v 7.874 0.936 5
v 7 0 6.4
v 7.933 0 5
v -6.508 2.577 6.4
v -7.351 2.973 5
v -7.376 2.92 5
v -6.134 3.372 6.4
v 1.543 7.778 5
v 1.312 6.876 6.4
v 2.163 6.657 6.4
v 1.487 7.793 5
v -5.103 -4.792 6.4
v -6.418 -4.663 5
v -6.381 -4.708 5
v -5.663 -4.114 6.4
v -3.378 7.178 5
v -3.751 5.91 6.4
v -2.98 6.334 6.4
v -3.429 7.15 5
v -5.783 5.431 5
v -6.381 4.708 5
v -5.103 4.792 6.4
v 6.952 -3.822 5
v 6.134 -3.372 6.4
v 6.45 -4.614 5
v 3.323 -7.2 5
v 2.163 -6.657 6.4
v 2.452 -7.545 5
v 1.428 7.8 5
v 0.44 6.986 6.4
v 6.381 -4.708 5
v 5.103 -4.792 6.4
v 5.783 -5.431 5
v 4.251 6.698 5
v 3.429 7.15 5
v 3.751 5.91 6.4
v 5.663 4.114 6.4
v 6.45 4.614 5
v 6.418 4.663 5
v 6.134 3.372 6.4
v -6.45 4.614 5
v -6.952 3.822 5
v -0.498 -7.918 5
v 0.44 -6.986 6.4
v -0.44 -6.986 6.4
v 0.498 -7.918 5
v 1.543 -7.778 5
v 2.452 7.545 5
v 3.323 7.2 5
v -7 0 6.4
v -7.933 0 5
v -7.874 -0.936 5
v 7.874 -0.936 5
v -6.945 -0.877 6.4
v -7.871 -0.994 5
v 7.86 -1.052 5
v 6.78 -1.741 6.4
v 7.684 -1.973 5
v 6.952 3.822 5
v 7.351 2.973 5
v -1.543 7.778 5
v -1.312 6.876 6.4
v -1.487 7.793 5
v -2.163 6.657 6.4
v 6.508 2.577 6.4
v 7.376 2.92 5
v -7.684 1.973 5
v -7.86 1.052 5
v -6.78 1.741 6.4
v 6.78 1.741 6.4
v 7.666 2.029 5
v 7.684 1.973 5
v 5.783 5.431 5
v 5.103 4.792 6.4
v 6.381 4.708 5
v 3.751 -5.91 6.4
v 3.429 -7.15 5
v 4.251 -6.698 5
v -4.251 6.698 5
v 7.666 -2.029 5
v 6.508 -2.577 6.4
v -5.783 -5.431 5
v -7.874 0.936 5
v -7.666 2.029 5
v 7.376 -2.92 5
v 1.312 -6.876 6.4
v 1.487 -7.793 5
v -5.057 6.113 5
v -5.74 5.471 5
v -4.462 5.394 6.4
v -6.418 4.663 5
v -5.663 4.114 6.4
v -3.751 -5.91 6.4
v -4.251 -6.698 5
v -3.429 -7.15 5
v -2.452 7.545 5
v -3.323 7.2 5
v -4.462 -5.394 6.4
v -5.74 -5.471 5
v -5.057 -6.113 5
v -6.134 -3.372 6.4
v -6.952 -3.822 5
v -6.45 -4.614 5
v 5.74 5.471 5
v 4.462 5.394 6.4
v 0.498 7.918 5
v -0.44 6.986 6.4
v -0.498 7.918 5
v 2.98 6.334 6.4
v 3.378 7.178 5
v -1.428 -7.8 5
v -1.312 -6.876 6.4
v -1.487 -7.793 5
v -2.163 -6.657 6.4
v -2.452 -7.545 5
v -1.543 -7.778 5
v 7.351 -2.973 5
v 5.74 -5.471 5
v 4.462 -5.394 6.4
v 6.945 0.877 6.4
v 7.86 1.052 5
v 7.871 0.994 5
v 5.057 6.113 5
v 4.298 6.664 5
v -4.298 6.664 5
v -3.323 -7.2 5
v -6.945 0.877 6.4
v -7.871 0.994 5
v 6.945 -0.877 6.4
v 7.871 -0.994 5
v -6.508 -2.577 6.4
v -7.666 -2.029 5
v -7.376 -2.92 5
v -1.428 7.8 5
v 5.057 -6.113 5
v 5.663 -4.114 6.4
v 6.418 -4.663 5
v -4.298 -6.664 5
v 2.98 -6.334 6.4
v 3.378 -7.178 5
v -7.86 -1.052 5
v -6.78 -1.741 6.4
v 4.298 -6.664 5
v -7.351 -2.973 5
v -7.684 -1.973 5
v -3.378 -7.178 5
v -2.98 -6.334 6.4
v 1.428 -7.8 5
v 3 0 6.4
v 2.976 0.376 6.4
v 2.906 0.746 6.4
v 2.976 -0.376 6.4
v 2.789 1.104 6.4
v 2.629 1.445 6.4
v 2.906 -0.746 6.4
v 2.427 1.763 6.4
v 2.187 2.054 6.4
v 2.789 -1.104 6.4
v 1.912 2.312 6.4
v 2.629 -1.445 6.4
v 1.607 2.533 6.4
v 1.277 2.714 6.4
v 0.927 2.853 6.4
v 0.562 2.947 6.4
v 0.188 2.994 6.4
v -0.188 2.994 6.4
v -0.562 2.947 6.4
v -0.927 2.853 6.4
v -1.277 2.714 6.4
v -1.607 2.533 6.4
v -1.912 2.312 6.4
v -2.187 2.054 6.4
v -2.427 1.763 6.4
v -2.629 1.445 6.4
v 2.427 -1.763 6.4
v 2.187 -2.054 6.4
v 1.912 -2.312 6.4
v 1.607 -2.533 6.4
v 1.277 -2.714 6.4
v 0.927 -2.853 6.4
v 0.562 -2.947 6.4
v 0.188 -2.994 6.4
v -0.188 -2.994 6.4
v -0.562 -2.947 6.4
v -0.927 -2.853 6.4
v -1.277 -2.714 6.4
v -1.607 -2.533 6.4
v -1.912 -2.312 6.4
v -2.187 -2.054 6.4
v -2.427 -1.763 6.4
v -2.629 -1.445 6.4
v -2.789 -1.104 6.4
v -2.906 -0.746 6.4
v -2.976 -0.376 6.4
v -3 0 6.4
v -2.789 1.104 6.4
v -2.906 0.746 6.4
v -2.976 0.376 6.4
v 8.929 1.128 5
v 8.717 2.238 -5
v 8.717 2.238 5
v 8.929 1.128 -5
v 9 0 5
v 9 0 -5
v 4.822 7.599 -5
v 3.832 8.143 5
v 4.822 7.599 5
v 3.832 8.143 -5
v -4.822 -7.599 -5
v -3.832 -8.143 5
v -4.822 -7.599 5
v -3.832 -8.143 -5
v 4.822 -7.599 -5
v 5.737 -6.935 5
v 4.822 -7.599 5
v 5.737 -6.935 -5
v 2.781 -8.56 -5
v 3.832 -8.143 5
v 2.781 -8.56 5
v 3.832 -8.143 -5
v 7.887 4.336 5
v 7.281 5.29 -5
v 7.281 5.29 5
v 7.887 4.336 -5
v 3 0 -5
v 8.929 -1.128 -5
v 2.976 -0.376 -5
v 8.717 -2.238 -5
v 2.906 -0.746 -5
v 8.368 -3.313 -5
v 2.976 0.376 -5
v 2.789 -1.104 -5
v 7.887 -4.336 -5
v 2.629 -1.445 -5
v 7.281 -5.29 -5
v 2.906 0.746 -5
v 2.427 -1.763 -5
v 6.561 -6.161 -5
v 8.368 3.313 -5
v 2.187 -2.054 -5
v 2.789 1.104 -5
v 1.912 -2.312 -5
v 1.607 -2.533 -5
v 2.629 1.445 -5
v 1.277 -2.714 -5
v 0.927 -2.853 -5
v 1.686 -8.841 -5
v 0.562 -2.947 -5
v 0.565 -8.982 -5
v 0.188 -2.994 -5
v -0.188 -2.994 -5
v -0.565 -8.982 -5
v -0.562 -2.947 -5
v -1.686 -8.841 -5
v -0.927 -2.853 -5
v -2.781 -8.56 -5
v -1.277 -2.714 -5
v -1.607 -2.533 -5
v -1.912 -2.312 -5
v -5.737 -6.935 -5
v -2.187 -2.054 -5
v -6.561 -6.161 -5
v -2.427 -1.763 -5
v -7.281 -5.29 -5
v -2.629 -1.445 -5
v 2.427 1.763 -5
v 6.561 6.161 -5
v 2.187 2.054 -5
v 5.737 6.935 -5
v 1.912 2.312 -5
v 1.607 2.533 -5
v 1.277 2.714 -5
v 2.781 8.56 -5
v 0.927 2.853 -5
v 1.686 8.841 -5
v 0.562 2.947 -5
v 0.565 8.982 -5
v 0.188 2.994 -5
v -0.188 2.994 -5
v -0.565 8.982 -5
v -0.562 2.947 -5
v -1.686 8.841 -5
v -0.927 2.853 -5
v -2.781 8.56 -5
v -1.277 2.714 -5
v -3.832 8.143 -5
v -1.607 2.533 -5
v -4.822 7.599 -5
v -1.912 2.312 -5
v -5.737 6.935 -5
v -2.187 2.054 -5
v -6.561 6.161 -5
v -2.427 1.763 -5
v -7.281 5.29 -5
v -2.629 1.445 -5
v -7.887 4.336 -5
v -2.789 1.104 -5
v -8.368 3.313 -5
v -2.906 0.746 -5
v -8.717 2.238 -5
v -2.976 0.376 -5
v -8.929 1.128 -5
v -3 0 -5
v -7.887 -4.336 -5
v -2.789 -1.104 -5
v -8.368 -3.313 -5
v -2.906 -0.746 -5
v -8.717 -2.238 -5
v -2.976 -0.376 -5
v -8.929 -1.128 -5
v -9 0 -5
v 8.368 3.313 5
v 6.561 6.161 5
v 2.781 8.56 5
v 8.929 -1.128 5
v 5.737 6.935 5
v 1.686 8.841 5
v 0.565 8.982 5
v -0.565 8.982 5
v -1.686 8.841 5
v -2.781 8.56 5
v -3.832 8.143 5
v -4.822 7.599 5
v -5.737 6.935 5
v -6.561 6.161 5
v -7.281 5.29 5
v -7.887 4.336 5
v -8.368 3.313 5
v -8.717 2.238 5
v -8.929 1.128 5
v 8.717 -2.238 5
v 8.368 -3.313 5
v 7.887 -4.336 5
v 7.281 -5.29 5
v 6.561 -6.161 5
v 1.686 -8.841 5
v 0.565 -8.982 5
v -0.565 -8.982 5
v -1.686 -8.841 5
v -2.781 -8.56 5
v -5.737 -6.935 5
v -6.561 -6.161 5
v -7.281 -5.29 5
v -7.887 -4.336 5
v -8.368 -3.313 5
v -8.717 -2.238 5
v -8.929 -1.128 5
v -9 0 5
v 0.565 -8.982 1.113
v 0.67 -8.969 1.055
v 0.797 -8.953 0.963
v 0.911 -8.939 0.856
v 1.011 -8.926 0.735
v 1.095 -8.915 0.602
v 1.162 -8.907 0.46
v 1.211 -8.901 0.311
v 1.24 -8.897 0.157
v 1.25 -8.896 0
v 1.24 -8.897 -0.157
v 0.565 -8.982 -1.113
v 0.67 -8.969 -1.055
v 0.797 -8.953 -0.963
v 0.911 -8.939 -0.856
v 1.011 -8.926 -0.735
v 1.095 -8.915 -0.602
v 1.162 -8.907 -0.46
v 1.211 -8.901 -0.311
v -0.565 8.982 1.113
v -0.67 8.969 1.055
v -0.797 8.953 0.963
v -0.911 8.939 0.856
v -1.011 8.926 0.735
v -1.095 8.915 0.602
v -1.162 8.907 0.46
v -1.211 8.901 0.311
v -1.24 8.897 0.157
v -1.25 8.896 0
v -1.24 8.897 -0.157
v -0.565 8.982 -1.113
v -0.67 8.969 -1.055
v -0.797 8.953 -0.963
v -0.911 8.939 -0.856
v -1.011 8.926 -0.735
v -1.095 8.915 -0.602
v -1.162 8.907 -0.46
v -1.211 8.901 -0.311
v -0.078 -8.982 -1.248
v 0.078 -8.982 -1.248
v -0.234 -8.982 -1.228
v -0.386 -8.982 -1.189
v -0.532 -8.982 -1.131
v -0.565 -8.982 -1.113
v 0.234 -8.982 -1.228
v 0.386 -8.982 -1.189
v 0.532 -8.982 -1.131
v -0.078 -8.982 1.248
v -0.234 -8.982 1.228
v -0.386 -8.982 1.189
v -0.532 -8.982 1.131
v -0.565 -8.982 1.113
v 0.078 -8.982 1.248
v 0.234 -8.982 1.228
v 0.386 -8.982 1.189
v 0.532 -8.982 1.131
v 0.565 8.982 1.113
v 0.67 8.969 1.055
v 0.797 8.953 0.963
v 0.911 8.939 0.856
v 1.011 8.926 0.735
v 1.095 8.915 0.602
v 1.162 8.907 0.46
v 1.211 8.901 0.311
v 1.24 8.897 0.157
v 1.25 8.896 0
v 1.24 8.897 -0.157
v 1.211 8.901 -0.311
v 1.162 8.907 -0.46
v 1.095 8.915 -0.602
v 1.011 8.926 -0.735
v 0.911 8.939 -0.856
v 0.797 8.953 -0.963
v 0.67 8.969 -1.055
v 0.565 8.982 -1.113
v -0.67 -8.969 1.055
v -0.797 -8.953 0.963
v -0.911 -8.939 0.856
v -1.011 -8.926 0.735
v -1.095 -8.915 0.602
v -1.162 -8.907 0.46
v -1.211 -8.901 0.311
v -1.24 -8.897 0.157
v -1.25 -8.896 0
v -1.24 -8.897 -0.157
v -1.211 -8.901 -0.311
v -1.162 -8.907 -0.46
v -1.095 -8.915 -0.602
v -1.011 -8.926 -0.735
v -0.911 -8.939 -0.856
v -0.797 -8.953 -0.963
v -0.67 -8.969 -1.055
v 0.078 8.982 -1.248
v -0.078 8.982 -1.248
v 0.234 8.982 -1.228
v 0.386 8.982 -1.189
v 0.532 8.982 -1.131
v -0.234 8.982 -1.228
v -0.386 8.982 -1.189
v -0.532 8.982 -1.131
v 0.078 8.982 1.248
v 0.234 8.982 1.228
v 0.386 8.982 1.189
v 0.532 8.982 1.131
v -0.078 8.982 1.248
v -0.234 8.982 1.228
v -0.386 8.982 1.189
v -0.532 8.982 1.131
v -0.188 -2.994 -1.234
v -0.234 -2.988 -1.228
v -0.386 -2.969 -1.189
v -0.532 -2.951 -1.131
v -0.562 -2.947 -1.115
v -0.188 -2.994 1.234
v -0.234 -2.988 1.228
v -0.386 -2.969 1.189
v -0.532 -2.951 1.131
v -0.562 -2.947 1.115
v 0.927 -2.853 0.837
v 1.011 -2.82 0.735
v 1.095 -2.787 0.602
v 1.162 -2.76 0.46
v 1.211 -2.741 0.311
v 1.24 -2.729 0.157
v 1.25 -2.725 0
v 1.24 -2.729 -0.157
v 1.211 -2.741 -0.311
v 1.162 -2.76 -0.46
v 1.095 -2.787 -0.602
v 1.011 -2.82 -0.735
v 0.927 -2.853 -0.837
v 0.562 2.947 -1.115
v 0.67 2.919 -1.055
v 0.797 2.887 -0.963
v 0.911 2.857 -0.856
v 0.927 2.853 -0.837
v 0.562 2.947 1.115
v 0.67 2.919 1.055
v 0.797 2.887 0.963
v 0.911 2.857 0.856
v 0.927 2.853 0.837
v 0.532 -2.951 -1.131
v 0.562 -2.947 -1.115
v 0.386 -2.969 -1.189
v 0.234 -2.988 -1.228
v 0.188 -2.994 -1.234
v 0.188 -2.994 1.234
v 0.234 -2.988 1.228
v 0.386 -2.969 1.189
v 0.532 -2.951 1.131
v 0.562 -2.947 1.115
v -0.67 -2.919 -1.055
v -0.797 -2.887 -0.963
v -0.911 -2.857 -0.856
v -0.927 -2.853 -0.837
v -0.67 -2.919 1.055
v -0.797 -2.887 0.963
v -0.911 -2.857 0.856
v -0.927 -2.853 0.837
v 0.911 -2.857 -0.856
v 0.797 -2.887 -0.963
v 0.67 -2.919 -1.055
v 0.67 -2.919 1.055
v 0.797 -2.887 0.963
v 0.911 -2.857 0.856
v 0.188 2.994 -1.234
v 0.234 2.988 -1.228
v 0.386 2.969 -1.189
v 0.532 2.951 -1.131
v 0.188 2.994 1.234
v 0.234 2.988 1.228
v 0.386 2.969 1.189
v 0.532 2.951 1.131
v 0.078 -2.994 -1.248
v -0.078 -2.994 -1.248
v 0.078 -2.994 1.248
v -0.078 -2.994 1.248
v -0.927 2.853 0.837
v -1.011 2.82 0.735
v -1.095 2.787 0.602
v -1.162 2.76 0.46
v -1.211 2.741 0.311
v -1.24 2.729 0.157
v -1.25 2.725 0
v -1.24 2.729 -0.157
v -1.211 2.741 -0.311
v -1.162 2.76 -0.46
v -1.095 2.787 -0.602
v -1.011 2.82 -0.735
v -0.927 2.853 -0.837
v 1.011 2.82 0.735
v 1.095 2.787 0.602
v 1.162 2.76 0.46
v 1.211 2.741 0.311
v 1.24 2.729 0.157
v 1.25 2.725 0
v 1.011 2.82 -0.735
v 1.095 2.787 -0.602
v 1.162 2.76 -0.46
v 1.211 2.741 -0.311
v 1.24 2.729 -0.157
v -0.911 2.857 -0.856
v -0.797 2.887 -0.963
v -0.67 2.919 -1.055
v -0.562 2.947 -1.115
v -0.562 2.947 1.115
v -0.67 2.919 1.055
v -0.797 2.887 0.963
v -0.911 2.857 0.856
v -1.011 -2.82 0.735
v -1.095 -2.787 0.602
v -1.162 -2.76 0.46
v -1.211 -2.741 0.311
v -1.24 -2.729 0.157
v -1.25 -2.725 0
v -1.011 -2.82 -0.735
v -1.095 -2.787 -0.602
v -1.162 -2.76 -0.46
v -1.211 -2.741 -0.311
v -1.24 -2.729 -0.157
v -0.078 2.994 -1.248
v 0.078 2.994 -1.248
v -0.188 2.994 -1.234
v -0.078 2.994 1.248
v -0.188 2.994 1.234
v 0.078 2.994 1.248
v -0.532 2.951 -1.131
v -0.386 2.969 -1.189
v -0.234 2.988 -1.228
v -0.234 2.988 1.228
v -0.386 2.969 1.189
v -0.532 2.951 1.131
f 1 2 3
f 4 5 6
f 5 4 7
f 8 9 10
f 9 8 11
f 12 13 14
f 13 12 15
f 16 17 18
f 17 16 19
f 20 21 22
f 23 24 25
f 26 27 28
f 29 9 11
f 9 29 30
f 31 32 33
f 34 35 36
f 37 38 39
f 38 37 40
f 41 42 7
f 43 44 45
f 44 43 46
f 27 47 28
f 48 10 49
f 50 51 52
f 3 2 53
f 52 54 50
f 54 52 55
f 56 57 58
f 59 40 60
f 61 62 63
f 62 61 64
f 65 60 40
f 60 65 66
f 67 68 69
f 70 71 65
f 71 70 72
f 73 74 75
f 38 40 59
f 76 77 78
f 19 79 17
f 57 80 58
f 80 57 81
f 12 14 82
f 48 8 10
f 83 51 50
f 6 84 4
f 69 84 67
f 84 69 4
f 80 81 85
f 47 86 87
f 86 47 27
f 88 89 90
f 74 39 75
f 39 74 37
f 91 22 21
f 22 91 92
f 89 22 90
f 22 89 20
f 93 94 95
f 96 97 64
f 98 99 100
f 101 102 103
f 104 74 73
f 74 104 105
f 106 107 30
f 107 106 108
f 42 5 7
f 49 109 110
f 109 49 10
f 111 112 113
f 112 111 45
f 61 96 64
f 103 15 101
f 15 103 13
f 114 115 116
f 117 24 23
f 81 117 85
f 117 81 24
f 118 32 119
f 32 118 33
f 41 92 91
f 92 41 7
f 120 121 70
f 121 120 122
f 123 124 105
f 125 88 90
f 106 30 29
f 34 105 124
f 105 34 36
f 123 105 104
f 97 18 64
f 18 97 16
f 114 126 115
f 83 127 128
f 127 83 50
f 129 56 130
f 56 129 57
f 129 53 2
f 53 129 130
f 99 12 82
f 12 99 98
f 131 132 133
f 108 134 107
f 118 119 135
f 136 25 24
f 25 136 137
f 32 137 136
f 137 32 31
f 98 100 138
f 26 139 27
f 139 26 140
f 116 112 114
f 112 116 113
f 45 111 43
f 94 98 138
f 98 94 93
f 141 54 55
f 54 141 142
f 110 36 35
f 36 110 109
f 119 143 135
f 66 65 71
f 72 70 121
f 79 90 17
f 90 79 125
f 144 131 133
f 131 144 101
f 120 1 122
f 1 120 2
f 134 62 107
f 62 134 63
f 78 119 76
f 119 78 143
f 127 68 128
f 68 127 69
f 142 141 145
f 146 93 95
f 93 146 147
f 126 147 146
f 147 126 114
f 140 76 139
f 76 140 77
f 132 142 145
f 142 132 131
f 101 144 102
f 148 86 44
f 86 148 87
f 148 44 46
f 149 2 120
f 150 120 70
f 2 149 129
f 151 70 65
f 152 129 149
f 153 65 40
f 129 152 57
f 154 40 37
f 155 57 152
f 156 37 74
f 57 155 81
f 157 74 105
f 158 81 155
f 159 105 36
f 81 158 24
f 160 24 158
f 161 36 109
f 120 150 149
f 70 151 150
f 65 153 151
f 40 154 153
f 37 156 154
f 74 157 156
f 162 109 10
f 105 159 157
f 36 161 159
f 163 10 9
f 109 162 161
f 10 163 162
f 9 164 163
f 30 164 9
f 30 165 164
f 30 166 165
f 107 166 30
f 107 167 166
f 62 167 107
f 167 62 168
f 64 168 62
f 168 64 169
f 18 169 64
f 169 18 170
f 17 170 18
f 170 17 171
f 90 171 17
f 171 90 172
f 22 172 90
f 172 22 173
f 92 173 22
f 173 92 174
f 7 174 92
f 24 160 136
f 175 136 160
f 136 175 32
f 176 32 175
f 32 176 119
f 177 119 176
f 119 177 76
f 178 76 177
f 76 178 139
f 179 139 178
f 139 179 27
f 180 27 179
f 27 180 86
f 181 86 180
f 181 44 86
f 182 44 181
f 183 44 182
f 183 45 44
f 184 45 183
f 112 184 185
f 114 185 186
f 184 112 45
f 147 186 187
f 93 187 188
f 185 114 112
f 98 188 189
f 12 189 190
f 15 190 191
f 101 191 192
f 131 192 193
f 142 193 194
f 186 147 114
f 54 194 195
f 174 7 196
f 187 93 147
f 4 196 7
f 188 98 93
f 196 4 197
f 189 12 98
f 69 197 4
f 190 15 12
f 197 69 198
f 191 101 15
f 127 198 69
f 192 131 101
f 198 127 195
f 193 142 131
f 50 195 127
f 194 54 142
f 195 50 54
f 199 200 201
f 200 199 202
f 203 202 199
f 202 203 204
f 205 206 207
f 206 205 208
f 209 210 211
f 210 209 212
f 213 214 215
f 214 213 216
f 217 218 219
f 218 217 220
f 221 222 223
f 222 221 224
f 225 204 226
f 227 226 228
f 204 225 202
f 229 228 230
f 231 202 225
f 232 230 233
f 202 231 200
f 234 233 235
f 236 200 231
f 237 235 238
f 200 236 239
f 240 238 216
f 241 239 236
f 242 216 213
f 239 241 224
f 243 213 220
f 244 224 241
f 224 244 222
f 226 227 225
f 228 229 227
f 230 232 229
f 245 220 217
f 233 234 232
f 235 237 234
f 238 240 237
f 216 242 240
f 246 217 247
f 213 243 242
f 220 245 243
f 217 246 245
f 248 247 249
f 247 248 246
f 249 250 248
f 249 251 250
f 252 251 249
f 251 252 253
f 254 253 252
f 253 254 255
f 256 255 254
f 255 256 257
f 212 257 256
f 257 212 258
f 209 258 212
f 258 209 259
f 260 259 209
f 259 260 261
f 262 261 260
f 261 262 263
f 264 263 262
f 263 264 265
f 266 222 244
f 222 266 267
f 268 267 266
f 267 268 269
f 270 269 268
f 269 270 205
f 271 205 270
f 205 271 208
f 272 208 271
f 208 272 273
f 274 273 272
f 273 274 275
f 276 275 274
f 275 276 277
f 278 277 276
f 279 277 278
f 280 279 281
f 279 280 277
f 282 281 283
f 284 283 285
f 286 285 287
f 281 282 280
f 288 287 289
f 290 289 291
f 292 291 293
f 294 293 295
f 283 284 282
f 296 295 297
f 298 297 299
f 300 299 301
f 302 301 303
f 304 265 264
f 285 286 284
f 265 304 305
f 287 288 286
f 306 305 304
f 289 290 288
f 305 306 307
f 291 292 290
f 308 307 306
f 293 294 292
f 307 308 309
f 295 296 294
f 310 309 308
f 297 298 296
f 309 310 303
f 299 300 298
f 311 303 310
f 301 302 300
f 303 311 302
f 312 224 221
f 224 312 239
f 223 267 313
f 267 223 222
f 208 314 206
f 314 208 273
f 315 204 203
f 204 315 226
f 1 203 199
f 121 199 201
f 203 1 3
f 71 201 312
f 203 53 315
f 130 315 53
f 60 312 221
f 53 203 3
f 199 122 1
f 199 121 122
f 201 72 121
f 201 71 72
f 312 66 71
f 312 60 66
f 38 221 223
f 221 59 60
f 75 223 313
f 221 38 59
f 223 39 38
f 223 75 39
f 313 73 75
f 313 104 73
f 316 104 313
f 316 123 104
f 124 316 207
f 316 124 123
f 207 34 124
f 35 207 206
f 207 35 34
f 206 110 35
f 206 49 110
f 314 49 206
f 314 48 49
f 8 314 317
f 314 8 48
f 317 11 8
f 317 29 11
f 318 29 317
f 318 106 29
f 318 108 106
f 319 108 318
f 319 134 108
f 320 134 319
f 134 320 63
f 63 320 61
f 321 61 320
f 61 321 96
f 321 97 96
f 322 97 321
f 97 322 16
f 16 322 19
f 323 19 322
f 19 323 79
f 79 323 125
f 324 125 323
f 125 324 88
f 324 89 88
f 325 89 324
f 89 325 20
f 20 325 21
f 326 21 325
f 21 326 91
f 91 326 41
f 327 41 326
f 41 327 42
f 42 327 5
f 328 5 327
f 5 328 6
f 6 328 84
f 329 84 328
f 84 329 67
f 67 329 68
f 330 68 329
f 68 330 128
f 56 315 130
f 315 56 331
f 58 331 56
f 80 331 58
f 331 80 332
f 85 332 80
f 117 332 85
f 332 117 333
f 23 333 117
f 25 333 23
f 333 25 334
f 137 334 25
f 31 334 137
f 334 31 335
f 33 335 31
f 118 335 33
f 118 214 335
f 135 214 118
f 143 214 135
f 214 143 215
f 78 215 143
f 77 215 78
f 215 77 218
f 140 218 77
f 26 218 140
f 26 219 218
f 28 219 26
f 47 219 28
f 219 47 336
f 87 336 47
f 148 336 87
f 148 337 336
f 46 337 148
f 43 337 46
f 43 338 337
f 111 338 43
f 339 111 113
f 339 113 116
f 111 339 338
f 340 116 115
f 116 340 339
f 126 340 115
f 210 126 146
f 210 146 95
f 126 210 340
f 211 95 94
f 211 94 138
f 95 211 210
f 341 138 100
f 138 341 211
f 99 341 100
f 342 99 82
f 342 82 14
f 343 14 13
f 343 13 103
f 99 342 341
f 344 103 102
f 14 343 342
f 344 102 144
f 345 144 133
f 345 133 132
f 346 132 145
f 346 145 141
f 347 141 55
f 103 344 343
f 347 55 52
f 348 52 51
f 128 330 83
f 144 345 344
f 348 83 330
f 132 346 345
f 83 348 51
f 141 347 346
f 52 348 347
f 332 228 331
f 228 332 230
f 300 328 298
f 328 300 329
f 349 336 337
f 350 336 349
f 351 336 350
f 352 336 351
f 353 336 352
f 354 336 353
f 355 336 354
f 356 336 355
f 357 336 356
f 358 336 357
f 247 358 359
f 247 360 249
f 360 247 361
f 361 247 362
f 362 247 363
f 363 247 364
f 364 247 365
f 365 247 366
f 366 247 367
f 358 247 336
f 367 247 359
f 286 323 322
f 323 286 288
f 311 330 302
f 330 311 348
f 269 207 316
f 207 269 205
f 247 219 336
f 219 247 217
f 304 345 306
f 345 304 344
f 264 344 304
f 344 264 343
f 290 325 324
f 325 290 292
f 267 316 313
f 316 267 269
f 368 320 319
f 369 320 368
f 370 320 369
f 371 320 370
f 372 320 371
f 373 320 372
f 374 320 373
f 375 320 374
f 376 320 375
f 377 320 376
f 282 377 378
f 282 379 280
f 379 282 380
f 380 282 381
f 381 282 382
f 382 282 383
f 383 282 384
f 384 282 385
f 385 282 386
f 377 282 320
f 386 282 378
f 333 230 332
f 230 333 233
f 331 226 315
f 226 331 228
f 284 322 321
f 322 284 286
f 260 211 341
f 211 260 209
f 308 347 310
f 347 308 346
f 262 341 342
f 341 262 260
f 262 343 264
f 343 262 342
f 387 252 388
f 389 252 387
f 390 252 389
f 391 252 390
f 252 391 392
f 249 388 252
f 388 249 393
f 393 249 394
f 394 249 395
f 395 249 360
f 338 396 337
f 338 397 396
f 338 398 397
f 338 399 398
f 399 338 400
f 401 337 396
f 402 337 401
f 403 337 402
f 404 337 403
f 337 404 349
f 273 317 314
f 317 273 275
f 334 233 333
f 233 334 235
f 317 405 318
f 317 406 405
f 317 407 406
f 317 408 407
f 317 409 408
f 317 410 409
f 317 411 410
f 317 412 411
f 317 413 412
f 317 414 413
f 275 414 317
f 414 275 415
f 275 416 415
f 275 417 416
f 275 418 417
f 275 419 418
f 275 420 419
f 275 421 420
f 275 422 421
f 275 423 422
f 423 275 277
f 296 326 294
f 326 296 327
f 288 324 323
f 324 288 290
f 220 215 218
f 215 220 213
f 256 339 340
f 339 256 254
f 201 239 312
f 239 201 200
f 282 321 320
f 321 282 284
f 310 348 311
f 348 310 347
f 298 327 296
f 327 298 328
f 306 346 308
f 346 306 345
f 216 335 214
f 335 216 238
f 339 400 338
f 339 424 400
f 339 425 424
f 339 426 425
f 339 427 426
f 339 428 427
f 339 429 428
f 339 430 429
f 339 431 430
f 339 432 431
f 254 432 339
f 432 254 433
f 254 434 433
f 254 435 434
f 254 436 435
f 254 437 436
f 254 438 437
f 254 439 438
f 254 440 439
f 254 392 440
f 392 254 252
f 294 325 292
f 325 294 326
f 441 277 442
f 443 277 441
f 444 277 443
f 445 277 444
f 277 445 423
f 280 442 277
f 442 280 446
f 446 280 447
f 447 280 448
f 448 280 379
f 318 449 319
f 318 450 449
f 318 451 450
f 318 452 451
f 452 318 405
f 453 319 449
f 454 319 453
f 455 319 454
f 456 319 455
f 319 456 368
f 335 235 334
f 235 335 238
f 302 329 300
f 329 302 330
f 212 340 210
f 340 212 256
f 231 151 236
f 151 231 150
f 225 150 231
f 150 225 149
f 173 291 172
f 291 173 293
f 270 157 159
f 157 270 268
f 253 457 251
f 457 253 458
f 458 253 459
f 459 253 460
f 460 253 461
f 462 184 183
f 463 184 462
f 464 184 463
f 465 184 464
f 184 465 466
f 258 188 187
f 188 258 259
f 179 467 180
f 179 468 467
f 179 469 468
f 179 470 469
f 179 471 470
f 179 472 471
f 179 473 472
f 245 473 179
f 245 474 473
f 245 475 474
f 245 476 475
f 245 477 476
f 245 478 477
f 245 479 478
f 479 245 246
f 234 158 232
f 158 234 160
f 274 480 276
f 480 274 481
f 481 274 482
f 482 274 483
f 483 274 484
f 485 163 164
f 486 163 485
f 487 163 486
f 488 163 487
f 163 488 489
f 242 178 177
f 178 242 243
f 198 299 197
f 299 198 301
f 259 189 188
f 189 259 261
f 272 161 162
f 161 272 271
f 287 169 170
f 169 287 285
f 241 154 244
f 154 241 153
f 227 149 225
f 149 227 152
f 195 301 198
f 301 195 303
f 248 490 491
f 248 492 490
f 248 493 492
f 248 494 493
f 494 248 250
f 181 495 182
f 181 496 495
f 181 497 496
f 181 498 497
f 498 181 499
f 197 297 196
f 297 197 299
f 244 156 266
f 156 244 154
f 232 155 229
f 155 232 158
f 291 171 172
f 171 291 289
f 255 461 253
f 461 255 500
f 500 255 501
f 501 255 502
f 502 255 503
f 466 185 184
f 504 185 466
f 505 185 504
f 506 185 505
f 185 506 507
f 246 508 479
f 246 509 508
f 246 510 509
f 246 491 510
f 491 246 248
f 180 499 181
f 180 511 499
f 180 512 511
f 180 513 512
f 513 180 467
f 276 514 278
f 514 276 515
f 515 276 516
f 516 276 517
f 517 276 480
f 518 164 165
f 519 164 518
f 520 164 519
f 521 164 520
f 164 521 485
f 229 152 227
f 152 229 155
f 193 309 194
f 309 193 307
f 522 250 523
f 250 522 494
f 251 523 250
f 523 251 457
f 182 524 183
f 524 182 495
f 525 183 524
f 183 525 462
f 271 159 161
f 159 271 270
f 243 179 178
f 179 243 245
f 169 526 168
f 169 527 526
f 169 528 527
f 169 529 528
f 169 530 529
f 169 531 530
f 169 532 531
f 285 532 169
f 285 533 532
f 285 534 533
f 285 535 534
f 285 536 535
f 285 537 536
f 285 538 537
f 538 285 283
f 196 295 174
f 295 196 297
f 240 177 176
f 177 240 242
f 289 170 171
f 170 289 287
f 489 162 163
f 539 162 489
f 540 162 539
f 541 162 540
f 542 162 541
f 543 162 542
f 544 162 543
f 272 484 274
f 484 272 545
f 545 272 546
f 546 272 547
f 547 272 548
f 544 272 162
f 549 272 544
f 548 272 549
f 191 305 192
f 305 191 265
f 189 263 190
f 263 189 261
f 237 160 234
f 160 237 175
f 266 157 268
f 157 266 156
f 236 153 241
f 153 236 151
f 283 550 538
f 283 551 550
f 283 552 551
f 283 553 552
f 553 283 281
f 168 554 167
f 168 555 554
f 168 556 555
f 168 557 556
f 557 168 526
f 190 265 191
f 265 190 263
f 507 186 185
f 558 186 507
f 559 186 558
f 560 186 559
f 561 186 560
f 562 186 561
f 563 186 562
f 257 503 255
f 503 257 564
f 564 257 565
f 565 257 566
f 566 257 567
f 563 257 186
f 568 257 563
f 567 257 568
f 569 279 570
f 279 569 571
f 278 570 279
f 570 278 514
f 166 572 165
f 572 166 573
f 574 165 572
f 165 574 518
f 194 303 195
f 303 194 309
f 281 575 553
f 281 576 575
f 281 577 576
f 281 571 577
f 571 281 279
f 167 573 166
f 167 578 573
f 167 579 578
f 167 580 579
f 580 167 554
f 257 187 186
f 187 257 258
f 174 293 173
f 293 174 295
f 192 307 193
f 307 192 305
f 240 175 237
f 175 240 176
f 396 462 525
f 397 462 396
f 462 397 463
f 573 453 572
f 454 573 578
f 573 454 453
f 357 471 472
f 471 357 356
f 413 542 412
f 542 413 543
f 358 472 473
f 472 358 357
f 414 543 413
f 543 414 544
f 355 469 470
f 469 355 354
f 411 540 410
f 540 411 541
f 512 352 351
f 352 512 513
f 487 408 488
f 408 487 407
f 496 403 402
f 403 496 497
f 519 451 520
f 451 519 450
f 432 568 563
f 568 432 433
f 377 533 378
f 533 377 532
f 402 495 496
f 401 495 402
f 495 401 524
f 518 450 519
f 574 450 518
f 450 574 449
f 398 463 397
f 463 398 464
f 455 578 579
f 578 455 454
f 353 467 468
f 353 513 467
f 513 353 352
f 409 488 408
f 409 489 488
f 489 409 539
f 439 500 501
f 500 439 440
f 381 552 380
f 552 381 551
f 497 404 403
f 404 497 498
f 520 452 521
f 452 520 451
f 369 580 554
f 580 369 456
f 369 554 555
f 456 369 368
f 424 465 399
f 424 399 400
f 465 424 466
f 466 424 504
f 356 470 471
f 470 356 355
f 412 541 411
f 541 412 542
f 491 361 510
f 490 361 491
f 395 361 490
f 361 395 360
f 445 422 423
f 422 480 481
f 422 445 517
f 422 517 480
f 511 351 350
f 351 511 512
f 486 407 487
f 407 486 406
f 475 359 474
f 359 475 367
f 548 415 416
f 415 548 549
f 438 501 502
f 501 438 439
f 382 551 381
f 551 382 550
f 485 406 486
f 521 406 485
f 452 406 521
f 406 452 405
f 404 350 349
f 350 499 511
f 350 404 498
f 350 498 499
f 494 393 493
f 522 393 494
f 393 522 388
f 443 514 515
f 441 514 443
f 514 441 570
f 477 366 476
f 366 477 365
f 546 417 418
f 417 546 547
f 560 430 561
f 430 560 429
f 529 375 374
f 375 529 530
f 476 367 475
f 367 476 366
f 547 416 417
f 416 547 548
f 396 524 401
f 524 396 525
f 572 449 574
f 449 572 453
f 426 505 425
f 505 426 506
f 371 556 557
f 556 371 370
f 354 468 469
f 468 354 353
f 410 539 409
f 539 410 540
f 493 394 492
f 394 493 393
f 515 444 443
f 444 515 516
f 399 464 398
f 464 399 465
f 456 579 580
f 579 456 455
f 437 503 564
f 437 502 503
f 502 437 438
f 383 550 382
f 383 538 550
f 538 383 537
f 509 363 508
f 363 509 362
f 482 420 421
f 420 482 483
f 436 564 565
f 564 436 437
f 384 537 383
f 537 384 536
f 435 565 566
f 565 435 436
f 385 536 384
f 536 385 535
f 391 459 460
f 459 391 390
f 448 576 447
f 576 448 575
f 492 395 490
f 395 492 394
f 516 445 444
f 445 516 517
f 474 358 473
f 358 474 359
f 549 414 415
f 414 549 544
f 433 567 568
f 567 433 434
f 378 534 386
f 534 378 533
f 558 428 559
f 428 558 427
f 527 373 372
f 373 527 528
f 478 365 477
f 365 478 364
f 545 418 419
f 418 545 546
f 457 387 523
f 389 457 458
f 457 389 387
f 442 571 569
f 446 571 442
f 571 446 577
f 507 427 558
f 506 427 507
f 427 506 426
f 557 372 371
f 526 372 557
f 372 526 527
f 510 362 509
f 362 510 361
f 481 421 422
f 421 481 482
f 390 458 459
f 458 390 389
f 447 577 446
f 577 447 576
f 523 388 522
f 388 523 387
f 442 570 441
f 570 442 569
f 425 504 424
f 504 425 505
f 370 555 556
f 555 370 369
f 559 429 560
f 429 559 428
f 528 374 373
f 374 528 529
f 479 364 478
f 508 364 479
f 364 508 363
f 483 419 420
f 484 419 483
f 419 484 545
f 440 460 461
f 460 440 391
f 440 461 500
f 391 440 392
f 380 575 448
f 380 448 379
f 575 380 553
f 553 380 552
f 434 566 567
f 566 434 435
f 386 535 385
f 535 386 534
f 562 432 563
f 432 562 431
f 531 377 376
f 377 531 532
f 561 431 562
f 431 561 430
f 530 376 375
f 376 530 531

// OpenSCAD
/// DistoX2 calibration handle screw head

sn=50;

difference() {
  union() {
    translate([0,0,4.9]) cylinder(h=1.5, d1=16,d2=14, center=false, $fn=sn);
    cylinder(h=10, d1=18,d2=18, center=true, $fn=sn);
  }
  cylinder(h=15, d1=6,d2=6, center=true, $fn=sn);
  
  rotate([90,0,0]) cylinder(h=20, d1=2.5,d2=2.5, center=true, $fn=sn);
}
